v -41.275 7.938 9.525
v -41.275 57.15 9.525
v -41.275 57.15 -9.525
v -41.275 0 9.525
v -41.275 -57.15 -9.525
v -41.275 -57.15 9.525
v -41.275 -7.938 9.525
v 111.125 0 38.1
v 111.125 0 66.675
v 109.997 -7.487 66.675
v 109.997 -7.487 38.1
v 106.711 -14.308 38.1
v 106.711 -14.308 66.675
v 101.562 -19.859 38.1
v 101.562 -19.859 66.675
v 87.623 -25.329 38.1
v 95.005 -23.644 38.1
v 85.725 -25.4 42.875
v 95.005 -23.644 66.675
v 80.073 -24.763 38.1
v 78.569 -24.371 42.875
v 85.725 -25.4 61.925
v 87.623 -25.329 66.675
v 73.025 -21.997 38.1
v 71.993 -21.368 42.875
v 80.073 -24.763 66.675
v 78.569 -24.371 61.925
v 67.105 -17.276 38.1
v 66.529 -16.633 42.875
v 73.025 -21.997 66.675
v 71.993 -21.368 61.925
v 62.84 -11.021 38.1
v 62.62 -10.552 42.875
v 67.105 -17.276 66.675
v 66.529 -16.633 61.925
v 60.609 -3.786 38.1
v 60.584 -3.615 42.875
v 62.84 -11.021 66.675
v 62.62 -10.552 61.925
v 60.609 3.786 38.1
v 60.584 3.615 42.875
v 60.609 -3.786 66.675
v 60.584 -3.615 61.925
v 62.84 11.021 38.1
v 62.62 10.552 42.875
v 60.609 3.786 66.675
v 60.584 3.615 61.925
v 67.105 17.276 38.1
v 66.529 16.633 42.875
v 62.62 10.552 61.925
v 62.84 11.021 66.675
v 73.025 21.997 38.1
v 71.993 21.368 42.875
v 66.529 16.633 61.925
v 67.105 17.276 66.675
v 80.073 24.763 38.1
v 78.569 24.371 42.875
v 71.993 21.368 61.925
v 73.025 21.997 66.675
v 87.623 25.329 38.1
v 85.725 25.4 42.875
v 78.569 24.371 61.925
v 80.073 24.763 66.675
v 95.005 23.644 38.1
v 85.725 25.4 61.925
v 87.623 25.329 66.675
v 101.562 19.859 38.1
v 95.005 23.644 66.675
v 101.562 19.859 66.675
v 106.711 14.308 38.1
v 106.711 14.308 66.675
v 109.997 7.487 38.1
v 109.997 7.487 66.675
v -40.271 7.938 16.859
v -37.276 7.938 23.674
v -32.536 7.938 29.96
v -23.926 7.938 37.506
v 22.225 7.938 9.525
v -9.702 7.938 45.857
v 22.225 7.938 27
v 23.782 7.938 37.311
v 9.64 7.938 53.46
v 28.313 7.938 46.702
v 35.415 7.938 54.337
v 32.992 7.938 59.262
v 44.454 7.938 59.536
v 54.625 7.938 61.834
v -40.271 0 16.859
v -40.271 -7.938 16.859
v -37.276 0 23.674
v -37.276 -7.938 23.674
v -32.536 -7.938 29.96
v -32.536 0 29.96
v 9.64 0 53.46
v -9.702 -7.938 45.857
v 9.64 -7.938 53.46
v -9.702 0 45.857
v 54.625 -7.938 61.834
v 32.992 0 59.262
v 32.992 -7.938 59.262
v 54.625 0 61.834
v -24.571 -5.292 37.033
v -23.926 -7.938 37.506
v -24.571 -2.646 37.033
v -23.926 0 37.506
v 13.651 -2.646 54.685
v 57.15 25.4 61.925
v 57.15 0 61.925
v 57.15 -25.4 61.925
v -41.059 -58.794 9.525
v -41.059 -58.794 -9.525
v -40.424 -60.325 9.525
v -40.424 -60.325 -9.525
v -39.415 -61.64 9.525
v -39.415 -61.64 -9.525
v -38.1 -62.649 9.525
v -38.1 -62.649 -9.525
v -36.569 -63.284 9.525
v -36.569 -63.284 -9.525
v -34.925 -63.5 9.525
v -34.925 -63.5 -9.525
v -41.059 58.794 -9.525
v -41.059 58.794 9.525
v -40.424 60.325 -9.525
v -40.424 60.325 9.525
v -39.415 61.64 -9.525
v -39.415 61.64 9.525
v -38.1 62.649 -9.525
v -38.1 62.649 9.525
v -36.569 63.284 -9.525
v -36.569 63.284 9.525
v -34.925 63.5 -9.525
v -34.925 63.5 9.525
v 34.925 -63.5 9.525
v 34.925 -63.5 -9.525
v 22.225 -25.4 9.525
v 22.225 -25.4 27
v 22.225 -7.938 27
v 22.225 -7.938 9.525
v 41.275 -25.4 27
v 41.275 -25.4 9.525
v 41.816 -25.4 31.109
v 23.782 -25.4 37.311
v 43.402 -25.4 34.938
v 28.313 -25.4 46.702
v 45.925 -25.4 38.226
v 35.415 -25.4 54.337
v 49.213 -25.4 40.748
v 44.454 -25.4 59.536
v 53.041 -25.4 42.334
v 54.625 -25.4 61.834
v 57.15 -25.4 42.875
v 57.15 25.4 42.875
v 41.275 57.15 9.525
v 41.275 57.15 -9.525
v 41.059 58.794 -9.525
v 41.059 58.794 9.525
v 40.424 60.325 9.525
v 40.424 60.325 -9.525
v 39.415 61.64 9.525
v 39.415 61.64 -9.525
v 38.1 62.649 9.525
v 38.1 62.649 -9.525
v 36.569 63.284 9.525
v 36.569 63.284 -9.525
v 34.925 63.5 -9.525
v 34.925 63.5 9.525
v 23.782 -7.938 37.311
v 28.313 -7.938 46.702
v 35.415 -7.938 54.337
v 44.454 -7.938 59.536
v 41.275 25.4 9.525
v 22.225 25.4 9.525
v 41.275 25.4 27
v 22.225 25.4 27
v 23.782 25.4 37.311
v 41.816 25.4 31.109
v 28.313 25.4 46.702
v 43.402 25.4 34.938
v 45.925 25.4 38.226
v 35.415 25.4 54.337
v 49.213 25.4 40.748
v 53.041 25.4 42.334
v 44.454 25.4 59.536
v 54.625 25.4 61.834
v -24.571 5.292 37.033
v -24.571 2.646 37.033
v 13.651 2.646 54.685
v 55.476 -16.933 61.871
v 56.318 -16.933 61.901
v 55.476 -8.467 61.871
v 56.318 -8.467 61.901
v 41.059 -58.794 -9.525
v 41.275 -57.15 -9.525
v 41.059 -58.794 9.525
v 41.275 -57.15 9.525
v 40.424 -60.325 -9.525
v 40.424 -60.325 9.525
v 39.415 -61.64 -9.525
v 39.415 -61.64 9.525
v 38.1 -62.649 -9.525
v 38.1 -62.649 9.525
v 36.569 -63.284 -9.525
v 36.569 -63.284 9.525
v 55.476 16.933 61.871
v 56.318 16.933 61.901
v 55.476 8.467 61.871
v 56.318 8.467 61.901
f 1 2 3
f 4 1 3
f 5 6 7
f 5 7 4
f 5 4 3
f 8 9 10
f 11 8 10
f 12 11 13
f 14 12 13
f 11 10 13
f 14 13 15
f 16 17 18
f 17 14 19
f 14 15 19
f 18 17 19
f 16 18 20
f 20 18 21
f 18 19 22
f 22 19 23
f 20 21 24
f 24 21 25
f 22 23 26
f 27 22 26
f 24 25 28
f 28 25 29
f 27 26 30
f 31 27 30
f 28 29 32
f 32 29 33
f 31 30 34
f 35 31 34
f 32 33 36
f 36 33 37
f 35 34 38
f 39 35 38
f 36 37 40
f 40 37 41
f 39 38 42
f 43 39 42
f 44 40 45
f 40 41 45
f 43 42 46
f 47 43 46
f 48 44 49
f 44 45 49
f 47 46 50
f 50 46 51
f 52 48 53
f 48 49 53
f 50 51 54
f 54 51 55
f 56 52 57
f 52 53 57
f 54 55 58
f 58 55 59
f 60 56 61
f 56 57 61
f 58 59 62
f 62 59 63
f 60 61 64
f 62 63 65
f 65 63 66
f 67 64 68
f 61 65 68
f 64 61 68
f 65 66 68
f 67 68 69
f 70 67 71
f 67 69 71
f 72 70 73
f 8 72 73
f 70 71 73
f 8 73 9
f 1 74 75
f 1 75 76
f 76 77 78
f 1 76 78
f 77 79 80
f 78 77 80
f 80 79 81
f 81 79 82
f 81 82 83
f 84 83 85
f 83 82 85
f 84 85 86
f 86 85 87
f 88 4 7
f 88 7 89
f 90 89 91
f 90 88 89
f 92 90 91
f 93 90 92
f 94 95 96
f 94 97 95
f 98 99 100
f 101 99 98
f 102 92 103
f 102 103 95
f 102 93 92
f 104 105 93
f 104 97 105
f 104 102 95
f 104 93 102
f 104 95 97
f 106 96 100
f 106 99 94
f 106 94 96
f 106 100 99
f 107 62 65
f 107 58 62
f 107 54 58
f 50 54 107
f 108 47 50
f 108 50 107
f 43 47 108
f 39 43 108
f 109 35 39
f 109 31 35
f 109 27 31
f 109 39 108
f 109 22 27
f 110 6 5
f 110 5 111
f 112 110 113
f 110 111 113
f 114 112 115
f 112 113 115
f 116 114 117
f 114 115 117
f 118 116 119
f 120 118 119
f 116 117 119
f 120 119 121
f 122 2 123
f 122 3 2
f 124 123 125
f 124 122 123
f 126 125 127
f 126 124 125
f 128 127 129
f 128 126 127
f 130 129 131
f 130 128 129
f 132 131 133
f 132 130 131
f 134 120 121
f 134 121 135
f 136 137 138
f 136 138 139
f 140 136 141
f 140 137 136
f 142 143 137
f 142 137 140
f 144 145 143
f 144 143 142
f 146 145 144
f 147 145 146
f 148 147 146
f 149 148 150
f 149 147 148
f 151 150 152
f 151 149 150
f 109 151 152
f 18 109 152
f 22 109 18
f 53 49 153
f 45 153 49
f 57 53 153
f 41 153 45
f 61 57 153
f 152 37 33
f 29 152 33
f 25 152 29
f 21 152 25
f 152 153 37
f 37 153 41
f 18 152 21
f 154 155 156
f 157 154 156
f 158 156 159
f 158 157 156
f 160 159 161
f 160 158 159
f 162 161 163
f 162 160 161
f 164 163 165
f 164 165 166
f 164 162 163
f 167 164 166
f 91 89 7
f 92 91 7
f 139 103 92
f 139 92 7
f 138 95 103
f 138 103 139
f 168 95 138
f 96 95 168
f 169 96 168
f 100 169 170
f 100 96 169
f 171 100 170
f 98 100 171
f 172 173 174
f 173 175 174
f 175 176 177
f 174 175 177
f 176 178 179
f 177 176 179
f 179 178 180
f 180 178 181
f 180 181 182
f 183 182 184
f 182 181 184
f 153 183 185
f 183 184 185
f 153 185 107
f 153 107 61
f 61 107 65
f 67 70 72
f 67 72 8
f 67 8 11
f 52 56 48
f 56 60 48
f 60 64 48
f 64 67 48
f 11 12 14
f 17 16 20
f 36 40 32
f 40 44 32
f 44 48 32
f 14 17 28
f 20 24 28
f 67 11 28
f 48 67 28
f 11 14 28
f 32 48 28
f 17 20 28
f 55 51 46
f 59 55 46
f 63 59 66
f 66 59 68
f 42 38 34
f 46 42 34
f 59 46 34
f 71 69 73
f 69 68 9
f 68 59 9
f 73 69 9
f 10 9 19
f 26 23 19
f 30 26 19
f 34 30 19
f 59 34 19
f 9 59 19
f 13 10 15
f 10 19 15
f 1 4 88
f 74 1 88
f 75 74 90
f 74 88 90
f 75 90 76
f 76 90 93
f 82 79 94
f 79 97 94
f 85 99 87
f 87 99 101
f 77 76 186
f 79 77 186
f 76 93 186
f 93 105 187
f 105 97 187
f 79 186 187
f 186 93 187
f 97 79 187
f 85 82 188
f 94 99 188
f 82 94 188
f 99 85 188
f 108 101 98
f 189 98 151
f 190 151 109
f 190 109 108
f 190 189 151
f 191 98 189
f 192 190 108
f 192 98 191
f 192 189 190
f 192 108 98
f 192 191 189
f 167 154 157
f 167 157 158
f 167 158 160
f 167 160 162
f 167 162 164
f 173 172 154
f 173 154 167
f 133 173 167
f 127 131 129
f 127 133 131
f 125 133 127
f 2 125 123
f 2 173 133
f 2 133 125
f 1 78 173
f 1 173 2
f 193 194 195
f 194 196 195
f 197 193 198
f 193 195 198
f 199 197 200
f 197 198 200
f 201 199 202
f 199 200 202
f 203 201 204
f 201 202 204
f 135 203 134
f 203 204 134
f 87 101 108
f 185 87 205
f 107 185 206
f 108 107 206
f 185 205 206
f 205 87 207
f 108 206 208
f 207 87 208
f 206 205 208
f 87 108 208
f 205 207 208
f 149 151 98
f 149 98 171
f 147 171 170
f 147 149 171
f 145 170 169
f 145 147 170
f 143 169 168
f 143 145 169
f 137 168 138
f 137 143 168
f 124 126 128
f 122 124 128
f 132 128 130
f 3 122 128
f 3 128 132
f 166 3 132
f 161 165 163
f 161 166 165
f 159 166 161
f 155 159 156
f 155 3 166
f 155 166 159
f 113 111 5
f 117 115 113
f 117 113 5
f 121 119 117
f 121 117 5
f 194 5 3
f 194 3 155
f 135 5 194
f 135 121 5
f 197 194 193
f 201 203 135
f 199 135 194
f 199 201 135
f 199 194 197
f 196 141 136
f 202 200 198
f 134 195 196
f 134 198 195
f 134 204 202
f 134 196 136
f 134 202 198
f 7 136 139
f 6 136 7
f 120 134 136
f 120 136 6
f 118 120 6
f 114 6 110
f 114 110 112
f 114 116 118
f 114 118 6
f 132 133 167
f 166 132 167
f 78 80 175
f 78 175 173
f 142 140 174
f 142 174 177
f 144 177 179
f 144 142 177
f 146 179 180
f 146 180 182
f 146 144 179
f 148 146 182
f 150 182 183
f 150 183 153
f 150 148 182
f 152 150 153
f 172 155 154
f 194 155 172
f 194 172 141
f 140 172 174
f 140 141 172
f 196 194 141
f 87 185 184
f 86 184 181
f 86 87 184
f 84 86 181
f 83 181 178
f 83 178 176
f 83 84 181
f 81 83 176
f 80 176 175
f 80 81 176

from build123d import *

# Parameters (mm, degrees)
F1_DEPTH = 63.5
F2_DEPTH = 7.9375
F0_W     = 25.4
F0_H     = 19.05
F3_DEPTH = 25.4
F5_R     = 6.35


with BuildPart() as f1:
    # F0 (on Front) → F1 (new body, symmetric)
    with BuildSketch(Plane.XZ):
        Polygon((41.275, -9.525), (41.275, 9.525), (22.225, 9.525), (-41.275, 9.525), (-41.275, -9.525), align=None)
    extrude(amount=F1_DEPTH, both=True)

    # F0 (on Front) → F2 (join, symmetric)
    with BuildSketch(Plane.XZ):
        with BuildLine():
            Line((-41.275, 9.525), (22.225, 9.525))
            Line((22.225, 9.525), (22.225, 27.0002))
            ThreePointArc((22.225, 27.0002), (31.5771327037, 50.7864162449), (54.6249475016, 61.8338006591))
            add(Edge.make_bspline(
                [(-41.275, 9.525), (-41.5838216247, 41.7459421201), (18.5290584876, 60.1514932336), (54.6249475016, 61.8338006591)],
                knots=[0, 0, 0, 0, 108.9228268403, 108.9228268403, 108.9228268403, 108.9228268403], degree=3))
        make_face()
    extrude(amount=F2_DEPTH, both=True)

    # F0 (on Front) → F3 (join, symmetric)
    with BuildSketch(Plane.XZ):
        with BuildLine():
            Line((22.225, 9.525), (41.275, 9.525))
            Line((41.275, 9.525), (41.275, 27.0002))
            ThreePointArc((41.275, 27.0002), (45.9246798487, 38.2255201513), (57.15, 42.8752))
            Line((57.15, 42.8752), (60.325, 42.8752))
            Line((60.325, 42.8752), (60.325, 61.9252))
            Line((60.325, 61.9252), (57.15, 61.9252))
            add(Edge.make_bspline(
                [(54.6249475016, 61.8338006591), (55.4804990504, 61.8736750261), (56.3225580044, 61.9041543798), (57.15, 61.9252)],
                knots=[108.9228268403, 108.9228268403, 108.9228268403, 108.9228268403, 111.5045361635, 111.5045361635, 111.5045361635, 111.5045361635], degree=3))
            ThreePointArc((54.6249475016, 61.8338006591), (31.5771327037, 50.7864162449), (22.225, 27.0002))
            Line((22.225, 27.0002), (22.225, 9.525))
        make_face()
        with Locations((73.025, 52.4002)):
            Rectangle(F0_W, F0_H)
    extrude(amount=F3_DEPTH, both=True)

    # F0 (on Front) → F4 (revolve)
    with BuildSketch(Plane.XZ):
        Polygon((85.725, 61.9252), (85.725, 42.8752), (85.725, 38.1), (111.125, 38.1), (111.125, 66.675), (85.725, 66.675), align=None)
    revolve(axis=Axis((85.725, 0, 52.3875), (0, 0, -1)))

    # F5
    f5_edges = [f1.edges().sort_by_distance(p)[0] for p in [
        (41.275, -63.5, 0),
        (-41.275, -63.5, 0),
        (41.275, 63.5, 0),
        (-41.275, 63.5, 0),
    ]]
    fillet(f5_edges, radius=F5_R)


solid = f1.part
